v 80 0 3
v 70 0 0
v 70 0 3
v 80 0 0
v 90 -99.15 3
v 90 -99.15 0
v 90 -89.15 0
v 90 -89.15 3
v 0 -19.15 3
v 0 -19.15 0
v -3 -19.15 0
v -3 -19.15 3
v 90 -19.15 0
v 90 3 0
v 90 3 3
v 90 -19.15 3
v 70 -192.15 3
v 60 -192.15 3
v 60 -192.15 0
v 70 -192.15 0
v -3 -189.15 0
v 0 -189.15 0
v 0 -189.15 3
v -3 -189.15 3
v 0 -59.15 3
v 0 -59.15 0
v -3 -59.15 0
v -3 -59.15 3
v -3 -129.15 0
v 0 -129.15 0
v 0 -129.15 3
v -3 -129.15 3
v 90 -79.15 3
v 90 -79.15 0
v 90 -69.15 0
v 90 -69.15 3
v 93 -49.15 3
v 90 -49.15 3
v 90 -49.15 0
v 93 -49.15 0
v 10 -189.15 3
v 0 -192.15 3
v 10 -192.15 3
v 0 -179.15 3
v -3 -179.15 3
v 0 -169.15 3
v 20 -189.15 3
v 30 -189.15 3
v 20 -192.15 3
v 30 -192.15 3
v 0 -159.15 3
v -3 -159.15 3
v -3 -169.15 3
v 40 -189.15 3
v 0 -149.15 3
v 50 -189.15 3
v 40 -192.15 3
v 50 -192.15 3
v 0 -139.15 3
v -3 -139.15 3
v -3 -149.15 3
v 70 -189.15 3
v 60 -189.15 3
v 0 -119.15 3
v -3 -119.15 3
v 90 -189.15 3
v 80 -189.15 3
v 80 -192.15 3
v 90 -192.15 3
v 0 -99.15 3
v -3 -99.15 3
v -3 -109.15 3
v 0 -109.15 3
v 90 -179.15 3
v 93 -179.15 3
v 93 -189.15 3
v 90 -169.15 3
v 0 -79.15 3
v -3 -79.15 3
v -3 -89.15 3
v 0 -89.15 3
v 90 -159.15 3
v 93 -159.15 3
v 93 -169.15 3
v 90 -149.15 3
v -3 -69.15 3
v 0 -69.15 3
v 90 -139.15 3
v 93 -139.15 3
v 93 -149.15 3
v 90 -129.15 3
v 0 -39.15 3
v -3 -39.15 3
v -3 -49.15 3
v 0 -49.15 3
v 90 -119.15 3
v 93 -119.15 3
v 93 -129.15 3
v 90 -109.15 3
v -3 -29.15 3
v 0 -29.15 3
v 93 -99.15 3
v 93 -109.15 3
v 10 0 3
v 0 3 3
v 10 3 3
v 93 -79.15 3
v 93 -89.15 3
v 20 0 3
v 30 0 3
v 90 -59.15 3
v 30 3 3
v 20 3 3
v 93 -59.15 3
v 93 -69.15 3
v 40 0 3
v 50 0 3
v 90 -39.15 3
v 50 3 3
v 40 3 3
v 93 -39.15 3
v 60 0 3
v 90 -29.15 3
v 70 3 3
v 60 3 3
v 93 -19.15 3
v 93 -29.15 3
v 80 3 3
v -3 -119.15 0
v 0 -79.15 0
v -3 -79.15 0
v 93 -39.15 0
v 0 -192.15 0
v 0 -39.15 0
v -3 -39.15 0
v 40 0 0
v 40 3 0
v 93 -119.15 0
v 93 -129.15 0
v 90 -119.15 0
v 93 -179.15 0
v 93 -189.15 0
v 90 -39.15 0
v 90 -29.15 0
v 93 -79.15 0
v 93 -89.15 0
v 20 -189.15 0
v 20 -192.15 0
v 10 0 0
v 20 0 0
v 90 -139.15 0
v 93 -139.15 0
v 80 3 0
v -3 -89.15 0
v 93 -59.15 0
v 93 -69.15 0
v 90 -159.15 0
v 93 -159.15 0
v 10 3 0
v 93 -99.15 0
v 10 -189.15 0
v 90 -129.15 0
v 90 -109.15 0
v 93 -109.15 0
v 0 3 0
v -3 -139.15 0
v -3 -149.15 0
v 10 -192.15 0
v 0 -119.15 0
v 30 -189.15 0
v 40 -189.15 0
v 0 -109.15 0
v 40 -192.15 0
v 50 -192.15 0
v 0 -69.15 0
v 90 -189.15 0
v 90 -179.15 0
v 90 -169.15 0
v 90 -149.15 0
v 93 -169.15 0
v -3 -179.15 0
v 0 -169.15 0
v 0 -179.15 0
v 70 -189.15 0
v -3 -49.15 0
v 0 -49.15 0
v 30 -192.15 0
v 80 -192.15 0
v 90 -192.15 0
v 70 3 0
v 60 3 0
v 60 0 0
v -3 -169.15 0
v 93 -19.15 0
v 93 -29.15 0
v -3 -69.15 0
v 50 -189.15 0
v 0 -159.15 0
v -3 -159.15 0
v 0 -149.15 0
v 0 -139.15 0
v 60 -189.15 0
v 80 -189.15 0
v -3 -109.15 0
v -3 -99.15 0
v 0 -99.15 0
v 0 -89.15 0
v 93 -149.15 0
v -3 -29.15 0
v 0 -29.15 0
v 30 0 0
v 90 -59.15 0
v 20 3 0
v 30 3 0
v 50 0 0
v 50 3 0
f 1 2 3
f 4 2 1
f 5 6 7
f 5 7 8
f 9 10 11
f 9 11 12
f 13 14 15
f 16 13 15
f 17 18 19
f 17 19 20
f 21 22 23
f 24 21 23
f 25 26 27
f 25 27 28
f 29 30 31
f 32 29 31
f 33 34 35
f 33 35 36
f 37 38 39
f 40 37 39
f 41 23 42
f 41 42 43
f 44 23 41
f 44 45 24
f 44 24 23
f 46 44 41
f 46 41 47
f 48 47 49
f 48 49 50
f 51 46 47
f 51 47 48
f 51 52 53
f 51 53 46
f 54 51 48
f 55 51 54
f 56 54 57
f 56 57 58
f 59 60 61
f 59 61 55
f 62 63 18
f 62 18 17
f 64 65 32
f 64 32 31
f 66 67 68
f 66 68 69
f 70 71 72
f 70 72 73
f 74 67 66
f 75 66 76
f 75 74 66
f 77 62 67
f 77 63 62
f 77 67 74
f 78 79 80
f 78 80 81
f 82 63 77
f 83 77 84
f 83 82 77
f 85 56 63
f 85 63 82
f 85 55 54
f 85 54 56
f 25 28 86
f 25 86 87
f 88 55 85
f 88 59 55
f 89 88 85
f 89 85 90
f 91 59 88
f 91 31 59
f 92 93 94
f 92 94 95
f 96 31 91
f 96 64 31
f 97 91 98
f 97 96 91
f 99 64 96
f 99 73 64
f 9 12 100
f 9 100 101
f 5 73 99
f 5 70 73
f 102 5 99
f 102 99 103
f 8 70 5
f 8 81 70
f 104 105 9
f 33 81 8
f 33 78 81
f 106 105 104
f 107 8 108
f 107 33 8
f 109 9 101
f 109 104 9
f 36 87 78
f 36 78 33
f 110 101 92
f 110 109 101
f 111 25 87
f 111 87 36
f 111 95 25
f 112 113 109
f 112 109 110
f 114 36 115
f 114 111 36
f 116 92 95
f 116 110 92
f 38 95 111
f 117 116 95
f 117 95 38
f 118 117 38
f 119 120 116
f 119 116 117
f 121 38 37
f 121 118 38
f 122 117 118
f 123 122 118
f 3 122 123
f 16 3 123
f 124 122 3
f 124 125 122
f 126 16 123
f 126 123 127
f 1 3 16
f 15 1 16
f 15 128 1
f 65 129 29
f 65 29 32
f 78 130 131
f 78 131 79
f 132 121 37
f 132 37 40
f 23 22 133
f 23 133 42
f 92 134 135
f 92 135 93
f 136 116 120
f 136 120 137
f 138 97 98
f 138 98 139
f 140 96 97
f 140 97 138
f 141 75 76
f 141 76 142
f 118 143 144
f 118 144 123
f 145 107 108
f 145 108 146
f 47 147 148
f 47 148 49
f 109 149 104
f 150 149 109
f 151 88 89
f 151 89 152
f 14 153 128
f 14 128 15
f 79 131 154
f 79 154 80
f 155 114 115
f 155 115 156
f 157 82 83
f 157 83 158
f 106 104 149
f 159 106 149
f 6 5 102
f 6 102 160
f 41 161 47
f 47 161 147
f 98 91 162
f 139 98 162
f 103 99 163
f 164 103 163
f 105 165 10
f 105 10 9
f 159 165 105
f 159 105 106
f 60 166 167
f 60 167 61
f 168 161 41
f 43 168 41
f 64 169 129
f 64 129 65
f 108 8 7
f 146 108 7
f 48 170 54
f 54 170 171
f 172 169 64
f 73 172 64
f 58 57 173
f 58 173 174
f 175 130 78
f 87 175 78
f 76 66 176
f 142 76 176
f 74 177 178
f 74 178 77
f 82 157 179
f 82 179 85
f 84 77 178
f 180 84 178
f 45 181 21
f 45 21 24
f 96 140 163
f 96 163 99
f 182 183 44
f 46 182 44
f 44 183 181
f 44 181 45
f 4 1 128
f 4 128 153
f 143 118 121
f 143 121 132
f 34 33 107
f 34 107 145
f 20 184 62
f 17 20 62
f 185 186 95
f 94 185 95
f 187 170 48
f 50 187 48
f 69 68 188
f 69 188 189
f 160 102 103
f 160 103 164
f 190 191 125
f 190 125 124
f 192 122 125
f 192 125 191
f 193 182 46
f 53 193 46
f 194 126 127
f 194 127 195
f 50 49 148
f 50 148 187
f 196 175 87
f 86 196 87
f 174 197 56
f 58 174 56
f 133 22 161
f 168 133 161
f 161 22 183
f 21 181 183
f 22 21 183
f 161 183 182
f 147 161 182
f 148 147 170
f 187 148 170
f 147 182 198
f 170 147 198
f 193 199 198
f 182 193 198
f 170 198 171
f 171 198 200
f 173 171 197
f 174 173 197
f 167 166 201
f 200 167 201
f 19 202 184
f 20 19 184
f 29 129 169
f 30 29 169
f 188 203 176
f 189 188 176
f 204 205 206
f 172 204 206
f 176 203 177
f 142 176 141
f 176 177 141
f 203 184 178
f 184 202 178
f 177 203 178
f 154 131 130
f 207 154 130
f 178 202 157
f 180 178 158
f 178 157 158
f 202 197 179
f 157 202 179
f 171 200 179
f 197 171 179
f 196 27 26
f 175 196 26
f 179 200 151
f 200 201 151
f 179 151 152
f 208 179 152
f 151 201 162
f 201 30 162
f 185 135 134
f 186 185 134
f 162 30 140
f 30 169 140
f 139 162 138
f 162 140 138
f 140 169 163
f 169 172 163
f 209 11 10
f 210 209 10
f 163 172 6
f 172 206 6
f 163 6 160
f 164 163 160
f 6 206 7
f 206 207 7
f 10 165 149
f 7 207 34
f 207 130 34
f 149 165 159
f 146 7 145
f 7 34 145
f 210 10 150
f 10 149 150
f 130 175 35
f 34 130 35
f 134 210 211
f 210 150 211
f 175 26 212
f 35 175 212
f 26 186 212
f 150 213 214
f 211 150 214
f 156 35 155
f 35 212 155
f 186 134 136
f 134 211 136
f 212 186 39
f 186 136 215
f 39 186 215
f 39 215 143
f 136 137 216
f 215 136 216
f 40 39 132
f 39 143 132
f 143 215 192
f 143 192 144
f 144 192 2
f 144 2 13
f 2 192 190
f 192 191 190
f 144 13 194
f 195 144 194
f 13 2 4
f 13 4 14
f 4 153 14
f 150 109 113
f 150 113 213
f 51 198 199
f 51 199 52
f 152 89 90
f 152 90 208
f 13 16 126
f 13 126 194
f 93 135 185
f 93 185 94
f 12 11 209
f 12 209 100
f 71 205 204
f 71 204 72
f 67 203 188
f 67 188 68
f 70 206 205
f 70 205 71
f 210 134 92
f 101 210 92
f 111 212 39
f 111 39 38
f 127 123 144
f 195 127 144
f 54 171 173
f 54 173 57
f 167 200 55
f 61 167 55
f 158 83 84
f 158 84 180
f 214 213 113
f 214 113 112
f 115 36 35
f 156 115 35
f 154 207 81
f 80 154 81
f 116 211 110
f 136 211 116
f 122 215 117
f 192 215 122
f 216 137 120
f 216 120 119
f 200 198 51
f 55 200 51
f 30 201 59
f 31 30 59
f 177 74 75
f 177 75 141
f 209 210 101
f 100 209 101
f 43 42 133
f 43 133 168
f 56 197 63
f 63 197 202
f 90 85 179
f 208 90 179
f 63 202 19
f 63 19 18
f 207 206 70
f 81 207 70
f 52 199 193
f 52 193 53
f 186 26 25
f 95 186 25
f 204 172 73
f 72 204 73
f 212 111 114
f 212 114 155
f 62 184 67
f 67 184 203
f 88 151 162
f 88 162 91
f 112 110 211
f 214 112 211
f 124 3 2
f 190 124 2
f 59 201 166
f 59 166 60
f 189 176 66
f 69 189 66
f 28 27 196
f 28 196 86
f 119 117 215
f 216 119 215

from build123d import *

# Parameters (mm, degrees)
ESQUISSE1_W                = 90
ESQUISSE1_H                = 189.15
BOSS_EXTRU_1_DEPTH         = 3
ESQUISSE2_W                = 10
ESQUISSE2_H                = 3
BOSS_EXTRU_2_DEPTH         = 3
R_P_TITION_LIN_AIRE1_COUNT = 5
R_P_TITION_LIN_AIRE1_PITCH = 20
ESQUISSE3_W                = 10
ESQUISSE3_H                = 3
BOSS_EXTRU_3_DEPTH         = 3
R_P_TITION_LIN_AIRE2_COUNT = 5
R_P_TITION_LIN_AIRE2_PITCH = 20
ESQUISSE4_W                = 3
ESQUISSE4_H                = 10
BOSS_EXTRU_4_DEPTH         = 3
R_P_TITION_LIN_AIRE3_COUNT = 9
R_P_TITION_LIN_AIRE3_PITCH = 20
ESQUISSE5_W                = 3
ESQUISSE5_H                = 10
BOSS_EXTRU_5_DEPTH         = 3
R_P_TITION_LIN_AIRE4_COUNT = 9
R_P_TITION_LIN_AIRE4_PITCH = 20


with BuildPart() as part:
    # Esquisse1 → Boss.-Extru.1 (new body)
    with BuildSketch(Plane.XY):
        with Locations((45, -94.575)):
            Rectangle(ESQUISSE1_W, ESQUISSE1_H)
    extrude(amount=BOSS_EXTRU_1_DEPTH)

    # Esquisse2 → Boss.-Extru.2 (add)
    with BuildSketch(Plane(origin=(0, 0, 0), x_dir=(1, 0, 0), z_dir=(0, 1, 0))):
        with Locations((5, -1.5)):
            Rectangle(ESQUISSE2_W, ESQUISSE2_H)
    boss_extru_2 = extrude(amount=BOSS_EXTRU_2_DEPTH)

    # Répétition linéaire1: Boss.-Extru.2 ×5
    with Locations(*[(i * R_P_TITION_LIN_AIRE1_PITCH, 0, 0) for i in range(1, R_P_TITION_LIN_AIRE1_COUNT)]):
        add(boss_extru_2)

    # Esquisse3 → Boss.-Extru.3 (add)
    with BuildSketch(Plane.XZ.offset(189.15)):
        with Locations((5, 1.5)):
            Rectangle(ESQUISSE3_W, ESQUISSE3_H)
    boss_extru_3 = extrude(amount=BOSS_EXTRU_3_DEPTH)

    # Répétition linéaire2: Boss.-Extru.3 ×5
    with Locations(*[(i * R_P_TITION_LIN_AIRE2_PITCH, 0, 0) for i in range(1, R_P_TITION_LIN_AIRE2_COUNT)]):
        add(boss_extru_3)

    # Esquisse4 → Boss.-Extru.4 (add)
    with BuildSketch(Plane.ZY):
        with Locations((1.5, -184.15)):
            Rectangle(ESQUISSE4_W, ESQUISSE4_H)
    boss_extru_4 = extrude(amount=BOSS_EXTRU_4_DEPTH)

    # Répétition linéaire3: Boss.-Extru.4 ×9
    with Locations(*[(0, i * R_P_TITION_LIN_AIRE3_PITCH, 0) for i in range(1, R_P_TITION_LIN_AIRE3_COUNT)]):
        add(boss_extru_4)

    # Esquisse5 → Boss.-Extru.5 (add)
    with BuildSketch(Plane(origin=(90, 0, 0), x_dir=(0, 0, -1), z_dir=(1, 0, 0))):
        with Locations((-1.5, -184.15)):
            Rectangle(ESQUISSE5_W, ESQUISSE5_H)
    boss_extru_5 = extrude(amount=BOSS_EXTRU_5_DEPTH)

    # Répétition linéaire4: Boss.-Extru.5 ×9
    with Locations(*[(0, i * R_P_TITION_LIN_AIRE4_PITCH, 0) for i in range(1, R_P_TITION_LIN_AIRE4_COUNT)]):
        add(boss_extru_5)


solid = part.part
